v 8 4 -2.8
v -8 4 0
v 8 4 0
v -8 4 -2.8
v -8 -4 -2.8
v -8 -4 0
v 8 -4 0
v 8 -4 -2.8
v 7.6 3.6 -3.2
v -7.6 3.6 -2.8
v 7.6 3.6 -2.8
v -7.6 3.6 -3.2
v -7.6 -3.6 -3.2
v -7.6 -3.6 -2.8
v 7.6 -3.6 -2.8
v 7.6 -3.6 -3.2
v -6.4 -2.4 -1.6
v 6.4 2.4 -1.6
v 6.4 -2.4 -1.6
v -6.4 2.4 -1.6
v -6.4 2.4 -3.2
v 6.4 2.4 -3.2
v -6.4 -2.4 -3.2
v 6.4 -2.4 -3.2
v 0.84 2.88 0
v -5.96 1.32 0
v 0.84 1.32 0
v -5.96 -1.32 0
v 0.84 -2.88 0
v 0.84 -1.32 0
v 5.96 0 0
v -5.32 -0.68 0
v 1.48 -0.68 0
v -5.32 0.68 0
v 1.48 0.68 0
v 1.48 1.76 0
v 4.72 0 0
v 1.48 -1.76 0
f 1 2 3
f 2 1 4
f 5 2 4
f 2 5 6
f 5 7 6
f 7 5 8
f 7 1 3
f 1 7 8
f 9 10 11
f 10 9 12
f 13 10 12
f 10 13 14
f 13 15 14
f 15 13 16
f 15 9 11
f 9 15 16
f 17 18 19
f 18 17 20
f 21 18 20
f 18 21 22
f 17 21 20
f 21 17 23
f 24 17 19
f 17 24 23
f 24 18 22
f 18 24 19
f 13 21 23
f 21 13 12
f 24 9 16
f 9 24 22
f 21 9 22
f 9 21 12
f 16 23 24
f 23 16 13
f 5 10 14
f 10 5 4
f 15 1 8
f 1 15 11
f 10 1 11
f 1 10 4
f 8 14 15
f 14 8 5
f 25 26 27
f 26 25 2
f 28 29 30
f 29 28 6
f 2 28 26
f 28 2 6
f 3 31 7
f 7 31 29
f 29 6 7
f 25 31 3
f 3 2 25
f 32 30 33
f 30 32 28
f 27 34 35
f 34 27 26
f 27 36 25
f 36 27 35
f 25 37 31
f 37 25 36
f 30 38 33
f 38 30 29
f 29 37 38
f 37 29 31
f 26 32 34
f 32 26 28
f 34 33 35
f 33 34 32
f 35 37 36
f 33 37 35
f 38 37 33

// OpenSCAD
// file: ../p/box5.scad
use <../lib.scad>
function ldraw_lib__box5() = [
// 0 Box with 5 Faces and All Edges
// 0 Name: box5.dat
// 0 Author: James Jessiman
// 0 !LDRAW_ORG Primitive UPDATE 2012-01
// 0 !LICENSE Licensed under CC BY 4.0 : see CAreadme.txt
// 
// 0 BFC CERTIFY CCW
  [0,"BFC","CERTIFY"],
  [0,"BFC","CCW"],
// 
// 0 !HISTORY 2002-04-03 [sbliss] Modified for BFC compliance
// 0 !HISTORY 2002-04-25 [PTadmin] Official Update 2002-02
// 0 !HISTORY 2007-06-24 [PTadmin] Header formatted for Contributor Agreement
// 0 !HISTORY 2008-07-01 [PTadmin] Official Update 2008-01
// 0 !HISTORY 2012-02-16 [Philo] Changed to CCW
// 0 !HISTORY 2012-03-30 [PTadmin] Official Update 2012-01
// 
// 
// 2 24 1 1 1 -1 1 1
  [2,24,1,1,1,-1,1,1],
// 2 24 -1 1 1 -1 1 -1
  [2,24,-1,1,1,-1,1,-1],
// 2 24 -1 1 -1 1 1 -1
  [2,24,-1,1,-1,1,1,-1],
// 2 24 1 1 -1 1 1 1
  [2,24,1,1,-1,1,1,1],
// 2 24 1 0 1 -1 0 1
  [2,24,1,0,1,-1,0,1],
// 2 24 -1 0 1 -1 0 -1
  [2,24,-1,0,1,-1,0,-1],
// 2 24 -1 0 -1 1 0 -1
  [2,24,-1,0,-1,1,0,-1],
// 2 24 1 0 -1 1 0 1
  [2,24,1,0,-1,1,0,1],
// 2 24 1 0 1 1 1 1
  [2,24,1,0,1,1,1,1],
// 2 24 -1 0 1 -1 1 1
  [2,24,-1,0,1,-1,1,1],
// 2 24 1 0 -1 1 1 -1
  [2,24,1,0,-1,1,1,-1],
// 2 24 -1 0 -1 -1 1 -1
  [2,24,-1,0,-1,-1,1,-1],
// 4 16 -1 1 1 1 1 1 1 1 -1 -1 1 -1
  [4,16,-1,1,1,1,1,1,1,1,-1,-1,1,-1],
// 4 16 -1 1 1 -1 0 1 1 0 1 1 1 1
  [4,16,-1,1,1,-1,0,1,1,0,1,1,1,1],
// 4 16 -1 1 -1 -1 0 -1 -1 0 1 -1 1 1
  [4,16,-1,1,-1,-1,0,-1,-1,0,1,-1,1,1],
// 4 16 1 1 -1 1 0 -1 -1 0 -1 -1 1 -1
  [4,16,1,1,-1,1,0,-1,-1,0,-1,-1,1,-1],
// 4 16 1 1 1 1 0 1 1 0 -1 1 1 -1
  [4,16,1,1,1,1,0,1,1,0,-1,1,1,-1],
];
module ldraw_lib__box5(step=0, col=false, unit=2/5, alt=false, line=0.2, solid=!$preview)
    makepoly(ldraw_lib__box5(), step=step, col=col, unit=unit, alt=alt, line=line, solid=solid);
ldraw_lib__box5(line=0.2);
// file: ../p/box4.scad
use <../lib.scad>
function ldraw_lib__box4() = [
// 0 Box with 4 Faces (2 Parallel Pairs) and All Edges
// 0 Name: box4.dat
// 0 Author: James Jessiman
// 0 !LDRAW_ORG Primitive UPDATE 2012-01
// 0 !LICENSE Licensed under CC BY 4.0 : see CAreadme.txt
// 
// 0 BFC CERTIFY CCW
  [0,"BFC","CERTIFY"],
  [0,"BFC","CCW"],
// 
// 0 !HISTORY 2002-04-03 [sbliss] Modified for BFC compliance
// 0 !HISTORY 2002-04-25 [PTadmin] Official Update 2002-02
// 0 !HISTORY 2007-06-24 [PTadmin] Header formatted for Contributor Agreement
// 0 !HISTORY 2008-07-01 [PTadmin] Official Update 2008-01
// 0 !HISTORY 2012-02-16 [Philo] Changed to CCW
// 0 !HISTORY 2012-03-30 [PTadmin] Official Update 2012-01
// 
// 
// 2 24 1 1 1 -1 1 1
  [2,24,1,1,1,-1,1,1],
// 2 24 -1 1 1 -1 1 -1
  [2,24,-1,1,1,-1,1,-1],
// 2 24 -1 1 -1 1 1 -1
  [2,24,-1,1,-1,1,1,-1],
// 2 24 1 1 -1 1 1 1
  [2,24,1,1,-1,1,1,1],
// 2 24 1 0 1 -1 0 1
  [2,24,1,0,1,-1,0,1],
// 2 24 -1 0 1 -1 0 -1
  [2,24,-1,0,1,-1,0,-1],
// 2 24 -1 0 -1 1 0 -1
  [2,24,-1,0,-1,1,0,-1],
// 2 24 1 0 -1 1 0 1
  [2,24,1,0,-1,1,0,1],
// 2 24 1 0 1 1 1 1
  [2,24,1,0,1,1,1,1],
// 2 24 -1 0 1 -1 1 1
  [2,24,-1,0,1,-1,1,1],
// 2 24 1 0 -1 1 1 -1
  [2,24,1,0,-1,1,1,-1],
// 2 24 -1 0 -1 -1 1 -1
  [2,24,-1,0,-1,-1,1,-1],
// 4 16 -1 1 1 -1 0 1 1 0 1 1 1 1
  [4,16,-1,1,1,-1,0,1,1,0,1,1,1,1],
// 4 16 -1 1 -1 -1 0 -1 -1 0 1 -1 1 1
  [4,16,-1,1,-1,-1,0,-1,-1,0,1,-1,1,1],
// 4 16 1 1 -1 1 0 -1 -1 0 -1 -1 1 -1
  [4,16,1,1,-1,1,0,-1,-1,0,-1,-1,1,-1],
// 4 16 1 1 1 1 0 1 1 0 -1 1 1 -1
  [4,16,1,1,1,1,0,1,1,0,-1,1,1,-1],
];
module ldraw_lib__box4(step=0, col=false, unit=2/5, alt=false, line=0.2, solid=!$preview)
    makepoly(ldraw_lib__box4(), step=step, col=col, unit=unit, alt=alt, line=line, solid=solid);
ldraw_lib__box4(line=0.2);
// file: s/3069p06c.scad
use <../../lib.scad>
function ldraw_lib__s__3069p06c() = [
// 0 ~Tile  1 x  2 with Arrow Long Pattern (Arrow)
// 0 Name: s\3069p06c.dat
// 0 Author: William Howard [WilliamH]
// 0 !LDRAW_ORG Subpart UPDATE 2009-03
// 0 !LICENSE Licensed under CC BY 2.0 and CC BY 4.0 : see CAreadme.txt
// 
// 0 BFC CERTIFY CCW
  [0,"BFC","CERTIFY"],
  [0,"BFC","CCW"],
// 
// 0 !HISTORY 2009-05-02 [PTadmin] Official Update 2009-01
// 0 !HISTORY 2009-08-18 [anathema] Improved pattern
// 0 !HISTORY 2009-12-29 [PTadmin] Official Update 2009-03
// 
// 
// 4 16 -13.3 0 -1.7 3.7 0 -1.7 3.7 0 1.7 -13.3 0 1.7
  [4,16,-13.3,0,-1.7,3.7,0,-1.7,3.7,0,1.7,-13.3,0,1.7],
// 3 16 3.7 0 1.7 11.8 0 0 3.7 0 4.4
  [3,16,3.7,0,1.7,11.8,0,0,3.7,0,4.4],
// 3 16 3.7 0 -1.7 11.8 0 0 3.7 0 1.7
  [3,16,3.7,0,-1.7,11.8,0,0,3.7,0,1.7],
// 3 16 3.7 0 -4.4 11.8 0 0 3.7 0 -1.7
  [3,16,3.7,0,-4.4,11.8,0,0,3.7,0,-1.7],
// 0
];
module ldraw_lib__s__3069p06c(step=0, col=false, unit=2/5, alt=false, line=0.2, solid=!$preview)
    makepoly(ldraw_lib__s__3069p06c(), step=step, col=col, unit=unit, alt=alt, line=line, solid=solid);
ldraw_lib__s__3069p06c(line=0.2);
// file: s/3069p06b.scad
use <../../lib.scad>
function ldraw_lib__s__3069p06b() = [
// 0 ~Tile  1 x  2 with Arrow Long Pattern (Border)
// 0 Name: s\3069p06b.dat
// 0 Author: William Howard [WilliamH]
// 0 !LDRAW_ORG Subpart UPDATE 2009-03
// 0 !LICENSE Licensed under CC BY 2.0 and CC BY 4.0 : see CAreadme.txt
// 
// 0 BFC CERTIFY CCW
  [0,"BFC","CERTIFY"],
  [0,"BFC","CCW"],
// 
// 0 !HISTORY 2009-05-02 [PTadmin] Official Update 2009-01
// 0 !HISTORY 2009-08-18 [anathema] Improved pattern
// 0 !HISTORY 2009-10-09 [cwdee] Corrected small overlap
// 0 !HISTORY 2009-12-29 [PTadmin] Official Update 2009-03
// 
// 
// 4 16 -14.9 0 -3.3 2.1 0 -3.3 3.7 0 -1.7 -13.3 0 -1.7
  [4,16,-14.9,0,-3.3,2.1,0,-3.3,3.7,0,-1.7,-13.3,0,-1.7],
// 4 16 -13.3 0 1.7 3.7 0 1.7 2.1 0 3.3 -14.9 0 3.3
  [4,16,-13.3,0,1.7,3.7,0,1.7,2.1,0,3.3,-14.9,0,3.3],
// 4 16 2.1 0 7.2 2.1 0 3.3 3.7 0 1.7 3.7 0 4.4
  [4,16,2.1,0,7.2,2.1,0,3.3,3.7,0,1.7,3.7,0,4.4],
// 4 16 3.7 0 4.4 11.8 0 0 14.9 0 0 2.1 0 7.2
  [4,16,3.7,0,4.4,11.8,0,0,14.9,0,0,2.1,0,7.2],
// 4 16 3.7 0 -4.4 3.7 0 -1.7 2.1 0 -3.3 2.1 0 -7.2
  [4,16,3.7,0,-4.4,3.7,0,-1.7,2.1,0,-3.3,2.1,0,-7.2],
// 4 16 2.1 0 -7.2 14.9 0 0 11.8 0 0 3.7 0 -4.4
  [4,16,2.1,0,-7.2,14.9,0,0,11.8,0,0,3.7,0,-4.4],
// 4 16 -14.9 0 3.3 -14.9 0 -3.3 -13.3 0 -1.7 -13.3 0 1.7
  [4,16,-14.9,0,3.3,-14.9,0,-3.3,-13.3,0,-1.7,-13.3,0,1.7],
// 0
];
module ldraw_lib__s__3069p06b(step=0, col=false, unit=2/5, alt=false, line=0.2, solid=!$preview)
    makepoly(ldraw_lib__s__3069p06b(), step=step, col=col, unit=unit, alt=alt, line=line, solid=solid);
ldraw_lib__s__3069p06b(line=0.2);
// file: s/3069p06a.scad
use <../../lib.scad>
function ldraw_lib__s__3069p06a() = [
// 0 ~Tile  1 x  2 with Arrow Long Pattern (Mask)
// 0 Name: s\3069p06a.dat
// 0 Author: William Howard [WilliamH]
// 0 !LDRAW_ORG Subpart UPDATE 2009-03
// 0 !LICENSE Licensed under CC BY 2.0 and CC BY 4.0 : see CAreadme.txt
// 
// 0 BFC CERTIFY CCW
  [0,"BFC","CERTIFY"],
  [0,"BFC","CCW"],
// 
// 0 !HISTORY 2009-05-02 [PTadmin] Official Update 2009-01
// 0 !HISTORY 2009-08-18 [anathema] Improved pattern
// 0 !HISTORY 2009-12-29 [PTadmin] Official Update 2009-03
// 
// 
// 4 16 -14.9 0 3.3 2.1 0 3.3 2.1 0 7.2 -20 0 10
  [4,16,-14.9,0,3.3,2.1,0,3.3,2.1,0,7.2,-20,0,10],
// 4 16 -20 0 -10 2.1 0 -7.2 2.1 0 -3.3 -14.9 0 -3.3
  [4,16,-20,0,-10,2.1,0,-7.2,2.1,0,-3.3,-14.9,0,-3.3],
// 4 16 -20 0 10 -20 0 -10 -14.9 0 -3.3 -14.9 0 3.3
  [4,16,-20,0,10,-20,0,-10,-14.9,0,-3.3,-14.9,0,3.3],
// 3 16 20 0 10 14.9 0 0 20 0 -10
  [3,16,20,0,10,14.9,0,0,20,0,-10],
// 3 16 20 0 -10 14.9 0 0 2.1 0 -7.2
  [3,16,20,0,-10,14.9,0,0,2.1,0,-7.2],
// 3 16 2.1 0 -7.2 -20 0 -10 20 0 -10
  [3,16,2.1,0,-7.2,-20,0,-10,20,0,-10],
// 3 16 2.1 0 7.2 14.9 0 0 20 0 10
  [3,16,2.1,0,7.2,14.9,0,0,20,0,10],
// 3 16 20 0 10 -20 0 10 2.1 0 7.2
  [3,16,20,0,10,-20,0,10,2.1,0,7.2],
// 0
];
module ldraw_lib__s__3069p06a(step=0, col=false, unit=2/5, alt=false, line=0.2, solid=!$preview)
    makepoly(ldraw_lib__s__3069p06a(), step=step, col=col, unit=unit, alt=alt, line=line, solid=solid);
ldraw_lib__s__3069p06a(line=0.2);
// file: s/3069bs01.scad
use <../../lib.scad>
use <../../p/box4.scad>
use <../../p/box5.scad>
function ldraw_lib__s__3069bs01() = [
// 0 ~Tile  1 x  2 with Groove without Top Face
// 0 Name: s\3069bs01.dat
// 0 Author: Santeri Piippo [arezey]
// 0 !LDRAW_ORG Subpart UPDATE 2010-02
// 0 !LICENSE Licensed under CC BY 4.0 : see CAreadme.txt
// 
// 0 BFC CERTIFY CCW
  [0,"BFC","CERTIFY"],
  [0,"BFC","CCW"],
// 
// 0 !HISTORY 2010-07-05 [PTadmin] Official Update 2010-02
// 
// 
// 1 16 0 0 0 20 0 0 0 7 0 0 0 10 box4.dat
  [1,16,0,0,0,20,0,0,0,7,0,0,0,10, ldraw_lib__box4()],
// 1 16 0 7 0 19 0 0 0 1 0 0 0 9 box4.dat
  [1,16,0,7,0,19,0,0,0,1,0,0,0,9, ldraw_lib__box4()],
// 0 BFC INVERTNEXT
  [0,"BFC","INVERTNEXT"],
// 1 16 0 8 0 16 0 0 0 -4 0 0 0 6 box5.dat
  [1,16,0,8,0,16,0,0,0,-4,0,0,0,6, ldraw_lib__box5()],
// 4 16 -19 8 9 -16 8 6 -16 8 -6 -19 8 -9
  [4,16,-19,8,9,-16,8,6,-16,8,-6,-19,8,-9],
// 4 16 19 8 -9 16 8 -6 16 8 6 19 8 9
  [4,16,19,8,-9,16,8,-6,16,8,6,19,8,9],
// 4 16 19 8 9 16 8 6 -16 8 6 -19 8 9
  [4,16,19,8,9,16,8,6,-16,8,6,-19,8,9],
// 4 16 -19 8 -9 -16 8 -6 16 8 -6 19 8 -9
  [4,16,-19,8,-9,-16,8,-6,16,8,-6,19,8,-9],
// 4 16 -20 7 10 -19 7 9 -19 7 -9 -20 7 -10
  [4,16,-20,7,10,-19,7,9,-19,7,-9,-20,7,-10],
// 4 16 20 7 -10 19 7 -9 19 7 9 20 7 10
  [4,16,20,7,-10,19,7,-9,19,7,9,20,7,10],
// 4 16 20 7 10 19 7 9 -19 7 9 -20 7 10
  [4,16,20,7,10,19,7,9,-19,7,9,-20,7,10],
// 4 16 -20 7 -10 -19 7 -9 19 7 -9 20 7 -10
  [4,16,-20,7,-10,-19,7,-9,19,7,-9,20,7,-10],
// 0 //
];
module ldraw_lib__s__3069bs01(step=0, col=false, unit=2/5, alt=false, line=0.2, solid=!$preview)
    makepoly(ldraw_lib__s__3069bs01(), step=step, col=col, unit=unit, alt=alt, line=line, solid=solid);
ldraw_lib__s__3069bs01(line=0.2);
// main file
use <../lib.scad>
use <s/3069bs01.scad>
use <s/3069p06a.scad>
use <s/3069p06b.scad>
use <s/3069p06c.scad>
function ldraw_lib__3069bp07() = [
// 0 Tile  1 x  2 with Arrow Long DkRed with Silver Border Pattern
// 0 Name: 3069bp07.dat
// 0 Author: William Howard [WilliamH]
// 0 !LDRAW_ORG Part UPDATE 2013-01
// 0 !LICENSE Licensed under CC BY 2.0 and CC BY 4.0 : see CAreadme.txt
// 
// 0 BFC CERTIFY CCW
  [0,"BFC","CERTIFY"],
  [0,"BFC","CCW"],
// 
// 0 !KEYWORDS BrickLink 3069p07, Rebrickable 3069bpr0024, Set 6781
// 
// 0 !HISTORY 2009-05-02 [PTadmin] Official Update 2009-01
// 0 !HISTORY 2009-08-14 [anathema] Corrected border colour
// 0 !HISTORY 2009-12-29 [PTadmin] Official Update 2009-03
// 0 !HISTORY 2013-02-17 [MagFors] Changed colour 179 to 80 (printed silver)
// 0 !HISTORY 2013-07-21 [PTadmin] Official Update 2013-01
// 
// 
// 1 16 0 0 0 1 0 0 0 1 0 0 0 1 s\3069bs01.dat
  [1,16,0,0,0,1,0,0,0,1,0,0,0,1, ldraw_lib__s__3069bs01()],
// 1 16 0 0 0 1 0 0 0 1 0 0 0 1 s\3069p06a.dat
  [1,16,0,0,0,1,0,0,0,1,0,0,0,1, ldraw_lib__s__3069p06a()],
// 1 80 0 0 0 1 0 0 0 1 0 0 0 1 s\3069p06b.dat
  [1,80,0,0,0,1,0,0,0,1,0,0,0,1, ldraw_lib__s__3069p06b()],
// 1 320 0 0 0 1 0 0 0 1 0 0 0 1 s\3069p06c.dat
  [1,320,0,0,0,1,0,0,0,1,0,0,0,1, ldraw_lib__s__3069p06c()],
];
module ldraw_lib__3069bp07(step=0, col=false, unit=2/5, alt=false, line=0.2, solid=!$preview)
    makepoly(ldraw_lib__3069bp07(), step=step, col=col, unit=unit, alt=alt, line=line, solid=solid);
ldraw_lib__3069bp07(line=0.2);
